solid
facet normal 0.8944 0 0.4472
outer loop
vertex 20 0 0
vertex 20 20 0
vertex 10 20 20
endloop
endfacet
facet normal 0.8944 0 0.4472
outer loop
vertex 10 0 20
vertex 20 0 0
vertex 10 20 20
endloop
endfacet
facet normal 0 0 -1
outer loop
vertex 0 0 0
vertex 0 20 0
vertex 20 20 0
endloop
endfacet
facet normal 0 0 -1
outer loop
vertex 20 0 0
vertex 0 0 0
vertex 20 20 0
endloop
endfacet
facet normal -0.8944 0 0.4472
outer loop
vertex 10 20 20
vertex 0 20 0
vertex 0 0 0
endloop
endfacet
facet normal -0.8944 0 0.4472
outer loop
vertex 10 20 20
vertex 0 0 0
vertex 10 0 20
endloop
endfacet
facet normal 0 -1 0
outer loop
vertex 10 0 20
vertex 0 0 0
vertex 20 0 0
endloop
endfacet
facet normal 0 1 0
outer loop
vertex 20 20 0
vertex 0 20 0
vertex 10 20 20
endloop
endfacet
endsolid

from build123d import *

# Parameters (mm, degrees)
SKETCH1_W           = 20
SKETCH1_H           = 20
BOSS_EXTRUDE1_DEPTH = 20
CUT_EXTRUDE1_DEPTH  = 20
CUT_EXTRUDE2_DEPTH  = 20


with BuildPart() as part:
    # Sketch1 → Boss-Extrude1 (new body)
    with BuildSketch(Plane.XY):
        with Locations((10, 10)):
            Rectangle(SKETCH1_W, SKETCH1_H)
    extrude(amount=BOSS_EXTRUDE1_DEPTH)

    # Sketch2 → Cut-Extrude1 (cut)
    with BuildSketch(Plane(origin=(0, 20, 0), x_dir=(1, 0, 0), z_dir=(0, 1, 0))):
        Polygon((0, 0), (10, -20), (0, -20), align=None)
    extrude(amount=-CUT_EXTRUDE1_DEPTH, mode=Mode.SUBTRACT)

    # Sketch3 → Cut-Extrude2 (cut)
    with BuildSketch(Plane(origin=(0, 20, 0), x_dir=(1, 0, 0), z_dir=(0, 1, 0))):
        Polygon((20, 0), (10, -20), (20, -20), align=None)
    extrude(amount=-CUT_EXTRUDE2_DEPTH, mode=Mode.SUBTRACT)


solid = part.part
